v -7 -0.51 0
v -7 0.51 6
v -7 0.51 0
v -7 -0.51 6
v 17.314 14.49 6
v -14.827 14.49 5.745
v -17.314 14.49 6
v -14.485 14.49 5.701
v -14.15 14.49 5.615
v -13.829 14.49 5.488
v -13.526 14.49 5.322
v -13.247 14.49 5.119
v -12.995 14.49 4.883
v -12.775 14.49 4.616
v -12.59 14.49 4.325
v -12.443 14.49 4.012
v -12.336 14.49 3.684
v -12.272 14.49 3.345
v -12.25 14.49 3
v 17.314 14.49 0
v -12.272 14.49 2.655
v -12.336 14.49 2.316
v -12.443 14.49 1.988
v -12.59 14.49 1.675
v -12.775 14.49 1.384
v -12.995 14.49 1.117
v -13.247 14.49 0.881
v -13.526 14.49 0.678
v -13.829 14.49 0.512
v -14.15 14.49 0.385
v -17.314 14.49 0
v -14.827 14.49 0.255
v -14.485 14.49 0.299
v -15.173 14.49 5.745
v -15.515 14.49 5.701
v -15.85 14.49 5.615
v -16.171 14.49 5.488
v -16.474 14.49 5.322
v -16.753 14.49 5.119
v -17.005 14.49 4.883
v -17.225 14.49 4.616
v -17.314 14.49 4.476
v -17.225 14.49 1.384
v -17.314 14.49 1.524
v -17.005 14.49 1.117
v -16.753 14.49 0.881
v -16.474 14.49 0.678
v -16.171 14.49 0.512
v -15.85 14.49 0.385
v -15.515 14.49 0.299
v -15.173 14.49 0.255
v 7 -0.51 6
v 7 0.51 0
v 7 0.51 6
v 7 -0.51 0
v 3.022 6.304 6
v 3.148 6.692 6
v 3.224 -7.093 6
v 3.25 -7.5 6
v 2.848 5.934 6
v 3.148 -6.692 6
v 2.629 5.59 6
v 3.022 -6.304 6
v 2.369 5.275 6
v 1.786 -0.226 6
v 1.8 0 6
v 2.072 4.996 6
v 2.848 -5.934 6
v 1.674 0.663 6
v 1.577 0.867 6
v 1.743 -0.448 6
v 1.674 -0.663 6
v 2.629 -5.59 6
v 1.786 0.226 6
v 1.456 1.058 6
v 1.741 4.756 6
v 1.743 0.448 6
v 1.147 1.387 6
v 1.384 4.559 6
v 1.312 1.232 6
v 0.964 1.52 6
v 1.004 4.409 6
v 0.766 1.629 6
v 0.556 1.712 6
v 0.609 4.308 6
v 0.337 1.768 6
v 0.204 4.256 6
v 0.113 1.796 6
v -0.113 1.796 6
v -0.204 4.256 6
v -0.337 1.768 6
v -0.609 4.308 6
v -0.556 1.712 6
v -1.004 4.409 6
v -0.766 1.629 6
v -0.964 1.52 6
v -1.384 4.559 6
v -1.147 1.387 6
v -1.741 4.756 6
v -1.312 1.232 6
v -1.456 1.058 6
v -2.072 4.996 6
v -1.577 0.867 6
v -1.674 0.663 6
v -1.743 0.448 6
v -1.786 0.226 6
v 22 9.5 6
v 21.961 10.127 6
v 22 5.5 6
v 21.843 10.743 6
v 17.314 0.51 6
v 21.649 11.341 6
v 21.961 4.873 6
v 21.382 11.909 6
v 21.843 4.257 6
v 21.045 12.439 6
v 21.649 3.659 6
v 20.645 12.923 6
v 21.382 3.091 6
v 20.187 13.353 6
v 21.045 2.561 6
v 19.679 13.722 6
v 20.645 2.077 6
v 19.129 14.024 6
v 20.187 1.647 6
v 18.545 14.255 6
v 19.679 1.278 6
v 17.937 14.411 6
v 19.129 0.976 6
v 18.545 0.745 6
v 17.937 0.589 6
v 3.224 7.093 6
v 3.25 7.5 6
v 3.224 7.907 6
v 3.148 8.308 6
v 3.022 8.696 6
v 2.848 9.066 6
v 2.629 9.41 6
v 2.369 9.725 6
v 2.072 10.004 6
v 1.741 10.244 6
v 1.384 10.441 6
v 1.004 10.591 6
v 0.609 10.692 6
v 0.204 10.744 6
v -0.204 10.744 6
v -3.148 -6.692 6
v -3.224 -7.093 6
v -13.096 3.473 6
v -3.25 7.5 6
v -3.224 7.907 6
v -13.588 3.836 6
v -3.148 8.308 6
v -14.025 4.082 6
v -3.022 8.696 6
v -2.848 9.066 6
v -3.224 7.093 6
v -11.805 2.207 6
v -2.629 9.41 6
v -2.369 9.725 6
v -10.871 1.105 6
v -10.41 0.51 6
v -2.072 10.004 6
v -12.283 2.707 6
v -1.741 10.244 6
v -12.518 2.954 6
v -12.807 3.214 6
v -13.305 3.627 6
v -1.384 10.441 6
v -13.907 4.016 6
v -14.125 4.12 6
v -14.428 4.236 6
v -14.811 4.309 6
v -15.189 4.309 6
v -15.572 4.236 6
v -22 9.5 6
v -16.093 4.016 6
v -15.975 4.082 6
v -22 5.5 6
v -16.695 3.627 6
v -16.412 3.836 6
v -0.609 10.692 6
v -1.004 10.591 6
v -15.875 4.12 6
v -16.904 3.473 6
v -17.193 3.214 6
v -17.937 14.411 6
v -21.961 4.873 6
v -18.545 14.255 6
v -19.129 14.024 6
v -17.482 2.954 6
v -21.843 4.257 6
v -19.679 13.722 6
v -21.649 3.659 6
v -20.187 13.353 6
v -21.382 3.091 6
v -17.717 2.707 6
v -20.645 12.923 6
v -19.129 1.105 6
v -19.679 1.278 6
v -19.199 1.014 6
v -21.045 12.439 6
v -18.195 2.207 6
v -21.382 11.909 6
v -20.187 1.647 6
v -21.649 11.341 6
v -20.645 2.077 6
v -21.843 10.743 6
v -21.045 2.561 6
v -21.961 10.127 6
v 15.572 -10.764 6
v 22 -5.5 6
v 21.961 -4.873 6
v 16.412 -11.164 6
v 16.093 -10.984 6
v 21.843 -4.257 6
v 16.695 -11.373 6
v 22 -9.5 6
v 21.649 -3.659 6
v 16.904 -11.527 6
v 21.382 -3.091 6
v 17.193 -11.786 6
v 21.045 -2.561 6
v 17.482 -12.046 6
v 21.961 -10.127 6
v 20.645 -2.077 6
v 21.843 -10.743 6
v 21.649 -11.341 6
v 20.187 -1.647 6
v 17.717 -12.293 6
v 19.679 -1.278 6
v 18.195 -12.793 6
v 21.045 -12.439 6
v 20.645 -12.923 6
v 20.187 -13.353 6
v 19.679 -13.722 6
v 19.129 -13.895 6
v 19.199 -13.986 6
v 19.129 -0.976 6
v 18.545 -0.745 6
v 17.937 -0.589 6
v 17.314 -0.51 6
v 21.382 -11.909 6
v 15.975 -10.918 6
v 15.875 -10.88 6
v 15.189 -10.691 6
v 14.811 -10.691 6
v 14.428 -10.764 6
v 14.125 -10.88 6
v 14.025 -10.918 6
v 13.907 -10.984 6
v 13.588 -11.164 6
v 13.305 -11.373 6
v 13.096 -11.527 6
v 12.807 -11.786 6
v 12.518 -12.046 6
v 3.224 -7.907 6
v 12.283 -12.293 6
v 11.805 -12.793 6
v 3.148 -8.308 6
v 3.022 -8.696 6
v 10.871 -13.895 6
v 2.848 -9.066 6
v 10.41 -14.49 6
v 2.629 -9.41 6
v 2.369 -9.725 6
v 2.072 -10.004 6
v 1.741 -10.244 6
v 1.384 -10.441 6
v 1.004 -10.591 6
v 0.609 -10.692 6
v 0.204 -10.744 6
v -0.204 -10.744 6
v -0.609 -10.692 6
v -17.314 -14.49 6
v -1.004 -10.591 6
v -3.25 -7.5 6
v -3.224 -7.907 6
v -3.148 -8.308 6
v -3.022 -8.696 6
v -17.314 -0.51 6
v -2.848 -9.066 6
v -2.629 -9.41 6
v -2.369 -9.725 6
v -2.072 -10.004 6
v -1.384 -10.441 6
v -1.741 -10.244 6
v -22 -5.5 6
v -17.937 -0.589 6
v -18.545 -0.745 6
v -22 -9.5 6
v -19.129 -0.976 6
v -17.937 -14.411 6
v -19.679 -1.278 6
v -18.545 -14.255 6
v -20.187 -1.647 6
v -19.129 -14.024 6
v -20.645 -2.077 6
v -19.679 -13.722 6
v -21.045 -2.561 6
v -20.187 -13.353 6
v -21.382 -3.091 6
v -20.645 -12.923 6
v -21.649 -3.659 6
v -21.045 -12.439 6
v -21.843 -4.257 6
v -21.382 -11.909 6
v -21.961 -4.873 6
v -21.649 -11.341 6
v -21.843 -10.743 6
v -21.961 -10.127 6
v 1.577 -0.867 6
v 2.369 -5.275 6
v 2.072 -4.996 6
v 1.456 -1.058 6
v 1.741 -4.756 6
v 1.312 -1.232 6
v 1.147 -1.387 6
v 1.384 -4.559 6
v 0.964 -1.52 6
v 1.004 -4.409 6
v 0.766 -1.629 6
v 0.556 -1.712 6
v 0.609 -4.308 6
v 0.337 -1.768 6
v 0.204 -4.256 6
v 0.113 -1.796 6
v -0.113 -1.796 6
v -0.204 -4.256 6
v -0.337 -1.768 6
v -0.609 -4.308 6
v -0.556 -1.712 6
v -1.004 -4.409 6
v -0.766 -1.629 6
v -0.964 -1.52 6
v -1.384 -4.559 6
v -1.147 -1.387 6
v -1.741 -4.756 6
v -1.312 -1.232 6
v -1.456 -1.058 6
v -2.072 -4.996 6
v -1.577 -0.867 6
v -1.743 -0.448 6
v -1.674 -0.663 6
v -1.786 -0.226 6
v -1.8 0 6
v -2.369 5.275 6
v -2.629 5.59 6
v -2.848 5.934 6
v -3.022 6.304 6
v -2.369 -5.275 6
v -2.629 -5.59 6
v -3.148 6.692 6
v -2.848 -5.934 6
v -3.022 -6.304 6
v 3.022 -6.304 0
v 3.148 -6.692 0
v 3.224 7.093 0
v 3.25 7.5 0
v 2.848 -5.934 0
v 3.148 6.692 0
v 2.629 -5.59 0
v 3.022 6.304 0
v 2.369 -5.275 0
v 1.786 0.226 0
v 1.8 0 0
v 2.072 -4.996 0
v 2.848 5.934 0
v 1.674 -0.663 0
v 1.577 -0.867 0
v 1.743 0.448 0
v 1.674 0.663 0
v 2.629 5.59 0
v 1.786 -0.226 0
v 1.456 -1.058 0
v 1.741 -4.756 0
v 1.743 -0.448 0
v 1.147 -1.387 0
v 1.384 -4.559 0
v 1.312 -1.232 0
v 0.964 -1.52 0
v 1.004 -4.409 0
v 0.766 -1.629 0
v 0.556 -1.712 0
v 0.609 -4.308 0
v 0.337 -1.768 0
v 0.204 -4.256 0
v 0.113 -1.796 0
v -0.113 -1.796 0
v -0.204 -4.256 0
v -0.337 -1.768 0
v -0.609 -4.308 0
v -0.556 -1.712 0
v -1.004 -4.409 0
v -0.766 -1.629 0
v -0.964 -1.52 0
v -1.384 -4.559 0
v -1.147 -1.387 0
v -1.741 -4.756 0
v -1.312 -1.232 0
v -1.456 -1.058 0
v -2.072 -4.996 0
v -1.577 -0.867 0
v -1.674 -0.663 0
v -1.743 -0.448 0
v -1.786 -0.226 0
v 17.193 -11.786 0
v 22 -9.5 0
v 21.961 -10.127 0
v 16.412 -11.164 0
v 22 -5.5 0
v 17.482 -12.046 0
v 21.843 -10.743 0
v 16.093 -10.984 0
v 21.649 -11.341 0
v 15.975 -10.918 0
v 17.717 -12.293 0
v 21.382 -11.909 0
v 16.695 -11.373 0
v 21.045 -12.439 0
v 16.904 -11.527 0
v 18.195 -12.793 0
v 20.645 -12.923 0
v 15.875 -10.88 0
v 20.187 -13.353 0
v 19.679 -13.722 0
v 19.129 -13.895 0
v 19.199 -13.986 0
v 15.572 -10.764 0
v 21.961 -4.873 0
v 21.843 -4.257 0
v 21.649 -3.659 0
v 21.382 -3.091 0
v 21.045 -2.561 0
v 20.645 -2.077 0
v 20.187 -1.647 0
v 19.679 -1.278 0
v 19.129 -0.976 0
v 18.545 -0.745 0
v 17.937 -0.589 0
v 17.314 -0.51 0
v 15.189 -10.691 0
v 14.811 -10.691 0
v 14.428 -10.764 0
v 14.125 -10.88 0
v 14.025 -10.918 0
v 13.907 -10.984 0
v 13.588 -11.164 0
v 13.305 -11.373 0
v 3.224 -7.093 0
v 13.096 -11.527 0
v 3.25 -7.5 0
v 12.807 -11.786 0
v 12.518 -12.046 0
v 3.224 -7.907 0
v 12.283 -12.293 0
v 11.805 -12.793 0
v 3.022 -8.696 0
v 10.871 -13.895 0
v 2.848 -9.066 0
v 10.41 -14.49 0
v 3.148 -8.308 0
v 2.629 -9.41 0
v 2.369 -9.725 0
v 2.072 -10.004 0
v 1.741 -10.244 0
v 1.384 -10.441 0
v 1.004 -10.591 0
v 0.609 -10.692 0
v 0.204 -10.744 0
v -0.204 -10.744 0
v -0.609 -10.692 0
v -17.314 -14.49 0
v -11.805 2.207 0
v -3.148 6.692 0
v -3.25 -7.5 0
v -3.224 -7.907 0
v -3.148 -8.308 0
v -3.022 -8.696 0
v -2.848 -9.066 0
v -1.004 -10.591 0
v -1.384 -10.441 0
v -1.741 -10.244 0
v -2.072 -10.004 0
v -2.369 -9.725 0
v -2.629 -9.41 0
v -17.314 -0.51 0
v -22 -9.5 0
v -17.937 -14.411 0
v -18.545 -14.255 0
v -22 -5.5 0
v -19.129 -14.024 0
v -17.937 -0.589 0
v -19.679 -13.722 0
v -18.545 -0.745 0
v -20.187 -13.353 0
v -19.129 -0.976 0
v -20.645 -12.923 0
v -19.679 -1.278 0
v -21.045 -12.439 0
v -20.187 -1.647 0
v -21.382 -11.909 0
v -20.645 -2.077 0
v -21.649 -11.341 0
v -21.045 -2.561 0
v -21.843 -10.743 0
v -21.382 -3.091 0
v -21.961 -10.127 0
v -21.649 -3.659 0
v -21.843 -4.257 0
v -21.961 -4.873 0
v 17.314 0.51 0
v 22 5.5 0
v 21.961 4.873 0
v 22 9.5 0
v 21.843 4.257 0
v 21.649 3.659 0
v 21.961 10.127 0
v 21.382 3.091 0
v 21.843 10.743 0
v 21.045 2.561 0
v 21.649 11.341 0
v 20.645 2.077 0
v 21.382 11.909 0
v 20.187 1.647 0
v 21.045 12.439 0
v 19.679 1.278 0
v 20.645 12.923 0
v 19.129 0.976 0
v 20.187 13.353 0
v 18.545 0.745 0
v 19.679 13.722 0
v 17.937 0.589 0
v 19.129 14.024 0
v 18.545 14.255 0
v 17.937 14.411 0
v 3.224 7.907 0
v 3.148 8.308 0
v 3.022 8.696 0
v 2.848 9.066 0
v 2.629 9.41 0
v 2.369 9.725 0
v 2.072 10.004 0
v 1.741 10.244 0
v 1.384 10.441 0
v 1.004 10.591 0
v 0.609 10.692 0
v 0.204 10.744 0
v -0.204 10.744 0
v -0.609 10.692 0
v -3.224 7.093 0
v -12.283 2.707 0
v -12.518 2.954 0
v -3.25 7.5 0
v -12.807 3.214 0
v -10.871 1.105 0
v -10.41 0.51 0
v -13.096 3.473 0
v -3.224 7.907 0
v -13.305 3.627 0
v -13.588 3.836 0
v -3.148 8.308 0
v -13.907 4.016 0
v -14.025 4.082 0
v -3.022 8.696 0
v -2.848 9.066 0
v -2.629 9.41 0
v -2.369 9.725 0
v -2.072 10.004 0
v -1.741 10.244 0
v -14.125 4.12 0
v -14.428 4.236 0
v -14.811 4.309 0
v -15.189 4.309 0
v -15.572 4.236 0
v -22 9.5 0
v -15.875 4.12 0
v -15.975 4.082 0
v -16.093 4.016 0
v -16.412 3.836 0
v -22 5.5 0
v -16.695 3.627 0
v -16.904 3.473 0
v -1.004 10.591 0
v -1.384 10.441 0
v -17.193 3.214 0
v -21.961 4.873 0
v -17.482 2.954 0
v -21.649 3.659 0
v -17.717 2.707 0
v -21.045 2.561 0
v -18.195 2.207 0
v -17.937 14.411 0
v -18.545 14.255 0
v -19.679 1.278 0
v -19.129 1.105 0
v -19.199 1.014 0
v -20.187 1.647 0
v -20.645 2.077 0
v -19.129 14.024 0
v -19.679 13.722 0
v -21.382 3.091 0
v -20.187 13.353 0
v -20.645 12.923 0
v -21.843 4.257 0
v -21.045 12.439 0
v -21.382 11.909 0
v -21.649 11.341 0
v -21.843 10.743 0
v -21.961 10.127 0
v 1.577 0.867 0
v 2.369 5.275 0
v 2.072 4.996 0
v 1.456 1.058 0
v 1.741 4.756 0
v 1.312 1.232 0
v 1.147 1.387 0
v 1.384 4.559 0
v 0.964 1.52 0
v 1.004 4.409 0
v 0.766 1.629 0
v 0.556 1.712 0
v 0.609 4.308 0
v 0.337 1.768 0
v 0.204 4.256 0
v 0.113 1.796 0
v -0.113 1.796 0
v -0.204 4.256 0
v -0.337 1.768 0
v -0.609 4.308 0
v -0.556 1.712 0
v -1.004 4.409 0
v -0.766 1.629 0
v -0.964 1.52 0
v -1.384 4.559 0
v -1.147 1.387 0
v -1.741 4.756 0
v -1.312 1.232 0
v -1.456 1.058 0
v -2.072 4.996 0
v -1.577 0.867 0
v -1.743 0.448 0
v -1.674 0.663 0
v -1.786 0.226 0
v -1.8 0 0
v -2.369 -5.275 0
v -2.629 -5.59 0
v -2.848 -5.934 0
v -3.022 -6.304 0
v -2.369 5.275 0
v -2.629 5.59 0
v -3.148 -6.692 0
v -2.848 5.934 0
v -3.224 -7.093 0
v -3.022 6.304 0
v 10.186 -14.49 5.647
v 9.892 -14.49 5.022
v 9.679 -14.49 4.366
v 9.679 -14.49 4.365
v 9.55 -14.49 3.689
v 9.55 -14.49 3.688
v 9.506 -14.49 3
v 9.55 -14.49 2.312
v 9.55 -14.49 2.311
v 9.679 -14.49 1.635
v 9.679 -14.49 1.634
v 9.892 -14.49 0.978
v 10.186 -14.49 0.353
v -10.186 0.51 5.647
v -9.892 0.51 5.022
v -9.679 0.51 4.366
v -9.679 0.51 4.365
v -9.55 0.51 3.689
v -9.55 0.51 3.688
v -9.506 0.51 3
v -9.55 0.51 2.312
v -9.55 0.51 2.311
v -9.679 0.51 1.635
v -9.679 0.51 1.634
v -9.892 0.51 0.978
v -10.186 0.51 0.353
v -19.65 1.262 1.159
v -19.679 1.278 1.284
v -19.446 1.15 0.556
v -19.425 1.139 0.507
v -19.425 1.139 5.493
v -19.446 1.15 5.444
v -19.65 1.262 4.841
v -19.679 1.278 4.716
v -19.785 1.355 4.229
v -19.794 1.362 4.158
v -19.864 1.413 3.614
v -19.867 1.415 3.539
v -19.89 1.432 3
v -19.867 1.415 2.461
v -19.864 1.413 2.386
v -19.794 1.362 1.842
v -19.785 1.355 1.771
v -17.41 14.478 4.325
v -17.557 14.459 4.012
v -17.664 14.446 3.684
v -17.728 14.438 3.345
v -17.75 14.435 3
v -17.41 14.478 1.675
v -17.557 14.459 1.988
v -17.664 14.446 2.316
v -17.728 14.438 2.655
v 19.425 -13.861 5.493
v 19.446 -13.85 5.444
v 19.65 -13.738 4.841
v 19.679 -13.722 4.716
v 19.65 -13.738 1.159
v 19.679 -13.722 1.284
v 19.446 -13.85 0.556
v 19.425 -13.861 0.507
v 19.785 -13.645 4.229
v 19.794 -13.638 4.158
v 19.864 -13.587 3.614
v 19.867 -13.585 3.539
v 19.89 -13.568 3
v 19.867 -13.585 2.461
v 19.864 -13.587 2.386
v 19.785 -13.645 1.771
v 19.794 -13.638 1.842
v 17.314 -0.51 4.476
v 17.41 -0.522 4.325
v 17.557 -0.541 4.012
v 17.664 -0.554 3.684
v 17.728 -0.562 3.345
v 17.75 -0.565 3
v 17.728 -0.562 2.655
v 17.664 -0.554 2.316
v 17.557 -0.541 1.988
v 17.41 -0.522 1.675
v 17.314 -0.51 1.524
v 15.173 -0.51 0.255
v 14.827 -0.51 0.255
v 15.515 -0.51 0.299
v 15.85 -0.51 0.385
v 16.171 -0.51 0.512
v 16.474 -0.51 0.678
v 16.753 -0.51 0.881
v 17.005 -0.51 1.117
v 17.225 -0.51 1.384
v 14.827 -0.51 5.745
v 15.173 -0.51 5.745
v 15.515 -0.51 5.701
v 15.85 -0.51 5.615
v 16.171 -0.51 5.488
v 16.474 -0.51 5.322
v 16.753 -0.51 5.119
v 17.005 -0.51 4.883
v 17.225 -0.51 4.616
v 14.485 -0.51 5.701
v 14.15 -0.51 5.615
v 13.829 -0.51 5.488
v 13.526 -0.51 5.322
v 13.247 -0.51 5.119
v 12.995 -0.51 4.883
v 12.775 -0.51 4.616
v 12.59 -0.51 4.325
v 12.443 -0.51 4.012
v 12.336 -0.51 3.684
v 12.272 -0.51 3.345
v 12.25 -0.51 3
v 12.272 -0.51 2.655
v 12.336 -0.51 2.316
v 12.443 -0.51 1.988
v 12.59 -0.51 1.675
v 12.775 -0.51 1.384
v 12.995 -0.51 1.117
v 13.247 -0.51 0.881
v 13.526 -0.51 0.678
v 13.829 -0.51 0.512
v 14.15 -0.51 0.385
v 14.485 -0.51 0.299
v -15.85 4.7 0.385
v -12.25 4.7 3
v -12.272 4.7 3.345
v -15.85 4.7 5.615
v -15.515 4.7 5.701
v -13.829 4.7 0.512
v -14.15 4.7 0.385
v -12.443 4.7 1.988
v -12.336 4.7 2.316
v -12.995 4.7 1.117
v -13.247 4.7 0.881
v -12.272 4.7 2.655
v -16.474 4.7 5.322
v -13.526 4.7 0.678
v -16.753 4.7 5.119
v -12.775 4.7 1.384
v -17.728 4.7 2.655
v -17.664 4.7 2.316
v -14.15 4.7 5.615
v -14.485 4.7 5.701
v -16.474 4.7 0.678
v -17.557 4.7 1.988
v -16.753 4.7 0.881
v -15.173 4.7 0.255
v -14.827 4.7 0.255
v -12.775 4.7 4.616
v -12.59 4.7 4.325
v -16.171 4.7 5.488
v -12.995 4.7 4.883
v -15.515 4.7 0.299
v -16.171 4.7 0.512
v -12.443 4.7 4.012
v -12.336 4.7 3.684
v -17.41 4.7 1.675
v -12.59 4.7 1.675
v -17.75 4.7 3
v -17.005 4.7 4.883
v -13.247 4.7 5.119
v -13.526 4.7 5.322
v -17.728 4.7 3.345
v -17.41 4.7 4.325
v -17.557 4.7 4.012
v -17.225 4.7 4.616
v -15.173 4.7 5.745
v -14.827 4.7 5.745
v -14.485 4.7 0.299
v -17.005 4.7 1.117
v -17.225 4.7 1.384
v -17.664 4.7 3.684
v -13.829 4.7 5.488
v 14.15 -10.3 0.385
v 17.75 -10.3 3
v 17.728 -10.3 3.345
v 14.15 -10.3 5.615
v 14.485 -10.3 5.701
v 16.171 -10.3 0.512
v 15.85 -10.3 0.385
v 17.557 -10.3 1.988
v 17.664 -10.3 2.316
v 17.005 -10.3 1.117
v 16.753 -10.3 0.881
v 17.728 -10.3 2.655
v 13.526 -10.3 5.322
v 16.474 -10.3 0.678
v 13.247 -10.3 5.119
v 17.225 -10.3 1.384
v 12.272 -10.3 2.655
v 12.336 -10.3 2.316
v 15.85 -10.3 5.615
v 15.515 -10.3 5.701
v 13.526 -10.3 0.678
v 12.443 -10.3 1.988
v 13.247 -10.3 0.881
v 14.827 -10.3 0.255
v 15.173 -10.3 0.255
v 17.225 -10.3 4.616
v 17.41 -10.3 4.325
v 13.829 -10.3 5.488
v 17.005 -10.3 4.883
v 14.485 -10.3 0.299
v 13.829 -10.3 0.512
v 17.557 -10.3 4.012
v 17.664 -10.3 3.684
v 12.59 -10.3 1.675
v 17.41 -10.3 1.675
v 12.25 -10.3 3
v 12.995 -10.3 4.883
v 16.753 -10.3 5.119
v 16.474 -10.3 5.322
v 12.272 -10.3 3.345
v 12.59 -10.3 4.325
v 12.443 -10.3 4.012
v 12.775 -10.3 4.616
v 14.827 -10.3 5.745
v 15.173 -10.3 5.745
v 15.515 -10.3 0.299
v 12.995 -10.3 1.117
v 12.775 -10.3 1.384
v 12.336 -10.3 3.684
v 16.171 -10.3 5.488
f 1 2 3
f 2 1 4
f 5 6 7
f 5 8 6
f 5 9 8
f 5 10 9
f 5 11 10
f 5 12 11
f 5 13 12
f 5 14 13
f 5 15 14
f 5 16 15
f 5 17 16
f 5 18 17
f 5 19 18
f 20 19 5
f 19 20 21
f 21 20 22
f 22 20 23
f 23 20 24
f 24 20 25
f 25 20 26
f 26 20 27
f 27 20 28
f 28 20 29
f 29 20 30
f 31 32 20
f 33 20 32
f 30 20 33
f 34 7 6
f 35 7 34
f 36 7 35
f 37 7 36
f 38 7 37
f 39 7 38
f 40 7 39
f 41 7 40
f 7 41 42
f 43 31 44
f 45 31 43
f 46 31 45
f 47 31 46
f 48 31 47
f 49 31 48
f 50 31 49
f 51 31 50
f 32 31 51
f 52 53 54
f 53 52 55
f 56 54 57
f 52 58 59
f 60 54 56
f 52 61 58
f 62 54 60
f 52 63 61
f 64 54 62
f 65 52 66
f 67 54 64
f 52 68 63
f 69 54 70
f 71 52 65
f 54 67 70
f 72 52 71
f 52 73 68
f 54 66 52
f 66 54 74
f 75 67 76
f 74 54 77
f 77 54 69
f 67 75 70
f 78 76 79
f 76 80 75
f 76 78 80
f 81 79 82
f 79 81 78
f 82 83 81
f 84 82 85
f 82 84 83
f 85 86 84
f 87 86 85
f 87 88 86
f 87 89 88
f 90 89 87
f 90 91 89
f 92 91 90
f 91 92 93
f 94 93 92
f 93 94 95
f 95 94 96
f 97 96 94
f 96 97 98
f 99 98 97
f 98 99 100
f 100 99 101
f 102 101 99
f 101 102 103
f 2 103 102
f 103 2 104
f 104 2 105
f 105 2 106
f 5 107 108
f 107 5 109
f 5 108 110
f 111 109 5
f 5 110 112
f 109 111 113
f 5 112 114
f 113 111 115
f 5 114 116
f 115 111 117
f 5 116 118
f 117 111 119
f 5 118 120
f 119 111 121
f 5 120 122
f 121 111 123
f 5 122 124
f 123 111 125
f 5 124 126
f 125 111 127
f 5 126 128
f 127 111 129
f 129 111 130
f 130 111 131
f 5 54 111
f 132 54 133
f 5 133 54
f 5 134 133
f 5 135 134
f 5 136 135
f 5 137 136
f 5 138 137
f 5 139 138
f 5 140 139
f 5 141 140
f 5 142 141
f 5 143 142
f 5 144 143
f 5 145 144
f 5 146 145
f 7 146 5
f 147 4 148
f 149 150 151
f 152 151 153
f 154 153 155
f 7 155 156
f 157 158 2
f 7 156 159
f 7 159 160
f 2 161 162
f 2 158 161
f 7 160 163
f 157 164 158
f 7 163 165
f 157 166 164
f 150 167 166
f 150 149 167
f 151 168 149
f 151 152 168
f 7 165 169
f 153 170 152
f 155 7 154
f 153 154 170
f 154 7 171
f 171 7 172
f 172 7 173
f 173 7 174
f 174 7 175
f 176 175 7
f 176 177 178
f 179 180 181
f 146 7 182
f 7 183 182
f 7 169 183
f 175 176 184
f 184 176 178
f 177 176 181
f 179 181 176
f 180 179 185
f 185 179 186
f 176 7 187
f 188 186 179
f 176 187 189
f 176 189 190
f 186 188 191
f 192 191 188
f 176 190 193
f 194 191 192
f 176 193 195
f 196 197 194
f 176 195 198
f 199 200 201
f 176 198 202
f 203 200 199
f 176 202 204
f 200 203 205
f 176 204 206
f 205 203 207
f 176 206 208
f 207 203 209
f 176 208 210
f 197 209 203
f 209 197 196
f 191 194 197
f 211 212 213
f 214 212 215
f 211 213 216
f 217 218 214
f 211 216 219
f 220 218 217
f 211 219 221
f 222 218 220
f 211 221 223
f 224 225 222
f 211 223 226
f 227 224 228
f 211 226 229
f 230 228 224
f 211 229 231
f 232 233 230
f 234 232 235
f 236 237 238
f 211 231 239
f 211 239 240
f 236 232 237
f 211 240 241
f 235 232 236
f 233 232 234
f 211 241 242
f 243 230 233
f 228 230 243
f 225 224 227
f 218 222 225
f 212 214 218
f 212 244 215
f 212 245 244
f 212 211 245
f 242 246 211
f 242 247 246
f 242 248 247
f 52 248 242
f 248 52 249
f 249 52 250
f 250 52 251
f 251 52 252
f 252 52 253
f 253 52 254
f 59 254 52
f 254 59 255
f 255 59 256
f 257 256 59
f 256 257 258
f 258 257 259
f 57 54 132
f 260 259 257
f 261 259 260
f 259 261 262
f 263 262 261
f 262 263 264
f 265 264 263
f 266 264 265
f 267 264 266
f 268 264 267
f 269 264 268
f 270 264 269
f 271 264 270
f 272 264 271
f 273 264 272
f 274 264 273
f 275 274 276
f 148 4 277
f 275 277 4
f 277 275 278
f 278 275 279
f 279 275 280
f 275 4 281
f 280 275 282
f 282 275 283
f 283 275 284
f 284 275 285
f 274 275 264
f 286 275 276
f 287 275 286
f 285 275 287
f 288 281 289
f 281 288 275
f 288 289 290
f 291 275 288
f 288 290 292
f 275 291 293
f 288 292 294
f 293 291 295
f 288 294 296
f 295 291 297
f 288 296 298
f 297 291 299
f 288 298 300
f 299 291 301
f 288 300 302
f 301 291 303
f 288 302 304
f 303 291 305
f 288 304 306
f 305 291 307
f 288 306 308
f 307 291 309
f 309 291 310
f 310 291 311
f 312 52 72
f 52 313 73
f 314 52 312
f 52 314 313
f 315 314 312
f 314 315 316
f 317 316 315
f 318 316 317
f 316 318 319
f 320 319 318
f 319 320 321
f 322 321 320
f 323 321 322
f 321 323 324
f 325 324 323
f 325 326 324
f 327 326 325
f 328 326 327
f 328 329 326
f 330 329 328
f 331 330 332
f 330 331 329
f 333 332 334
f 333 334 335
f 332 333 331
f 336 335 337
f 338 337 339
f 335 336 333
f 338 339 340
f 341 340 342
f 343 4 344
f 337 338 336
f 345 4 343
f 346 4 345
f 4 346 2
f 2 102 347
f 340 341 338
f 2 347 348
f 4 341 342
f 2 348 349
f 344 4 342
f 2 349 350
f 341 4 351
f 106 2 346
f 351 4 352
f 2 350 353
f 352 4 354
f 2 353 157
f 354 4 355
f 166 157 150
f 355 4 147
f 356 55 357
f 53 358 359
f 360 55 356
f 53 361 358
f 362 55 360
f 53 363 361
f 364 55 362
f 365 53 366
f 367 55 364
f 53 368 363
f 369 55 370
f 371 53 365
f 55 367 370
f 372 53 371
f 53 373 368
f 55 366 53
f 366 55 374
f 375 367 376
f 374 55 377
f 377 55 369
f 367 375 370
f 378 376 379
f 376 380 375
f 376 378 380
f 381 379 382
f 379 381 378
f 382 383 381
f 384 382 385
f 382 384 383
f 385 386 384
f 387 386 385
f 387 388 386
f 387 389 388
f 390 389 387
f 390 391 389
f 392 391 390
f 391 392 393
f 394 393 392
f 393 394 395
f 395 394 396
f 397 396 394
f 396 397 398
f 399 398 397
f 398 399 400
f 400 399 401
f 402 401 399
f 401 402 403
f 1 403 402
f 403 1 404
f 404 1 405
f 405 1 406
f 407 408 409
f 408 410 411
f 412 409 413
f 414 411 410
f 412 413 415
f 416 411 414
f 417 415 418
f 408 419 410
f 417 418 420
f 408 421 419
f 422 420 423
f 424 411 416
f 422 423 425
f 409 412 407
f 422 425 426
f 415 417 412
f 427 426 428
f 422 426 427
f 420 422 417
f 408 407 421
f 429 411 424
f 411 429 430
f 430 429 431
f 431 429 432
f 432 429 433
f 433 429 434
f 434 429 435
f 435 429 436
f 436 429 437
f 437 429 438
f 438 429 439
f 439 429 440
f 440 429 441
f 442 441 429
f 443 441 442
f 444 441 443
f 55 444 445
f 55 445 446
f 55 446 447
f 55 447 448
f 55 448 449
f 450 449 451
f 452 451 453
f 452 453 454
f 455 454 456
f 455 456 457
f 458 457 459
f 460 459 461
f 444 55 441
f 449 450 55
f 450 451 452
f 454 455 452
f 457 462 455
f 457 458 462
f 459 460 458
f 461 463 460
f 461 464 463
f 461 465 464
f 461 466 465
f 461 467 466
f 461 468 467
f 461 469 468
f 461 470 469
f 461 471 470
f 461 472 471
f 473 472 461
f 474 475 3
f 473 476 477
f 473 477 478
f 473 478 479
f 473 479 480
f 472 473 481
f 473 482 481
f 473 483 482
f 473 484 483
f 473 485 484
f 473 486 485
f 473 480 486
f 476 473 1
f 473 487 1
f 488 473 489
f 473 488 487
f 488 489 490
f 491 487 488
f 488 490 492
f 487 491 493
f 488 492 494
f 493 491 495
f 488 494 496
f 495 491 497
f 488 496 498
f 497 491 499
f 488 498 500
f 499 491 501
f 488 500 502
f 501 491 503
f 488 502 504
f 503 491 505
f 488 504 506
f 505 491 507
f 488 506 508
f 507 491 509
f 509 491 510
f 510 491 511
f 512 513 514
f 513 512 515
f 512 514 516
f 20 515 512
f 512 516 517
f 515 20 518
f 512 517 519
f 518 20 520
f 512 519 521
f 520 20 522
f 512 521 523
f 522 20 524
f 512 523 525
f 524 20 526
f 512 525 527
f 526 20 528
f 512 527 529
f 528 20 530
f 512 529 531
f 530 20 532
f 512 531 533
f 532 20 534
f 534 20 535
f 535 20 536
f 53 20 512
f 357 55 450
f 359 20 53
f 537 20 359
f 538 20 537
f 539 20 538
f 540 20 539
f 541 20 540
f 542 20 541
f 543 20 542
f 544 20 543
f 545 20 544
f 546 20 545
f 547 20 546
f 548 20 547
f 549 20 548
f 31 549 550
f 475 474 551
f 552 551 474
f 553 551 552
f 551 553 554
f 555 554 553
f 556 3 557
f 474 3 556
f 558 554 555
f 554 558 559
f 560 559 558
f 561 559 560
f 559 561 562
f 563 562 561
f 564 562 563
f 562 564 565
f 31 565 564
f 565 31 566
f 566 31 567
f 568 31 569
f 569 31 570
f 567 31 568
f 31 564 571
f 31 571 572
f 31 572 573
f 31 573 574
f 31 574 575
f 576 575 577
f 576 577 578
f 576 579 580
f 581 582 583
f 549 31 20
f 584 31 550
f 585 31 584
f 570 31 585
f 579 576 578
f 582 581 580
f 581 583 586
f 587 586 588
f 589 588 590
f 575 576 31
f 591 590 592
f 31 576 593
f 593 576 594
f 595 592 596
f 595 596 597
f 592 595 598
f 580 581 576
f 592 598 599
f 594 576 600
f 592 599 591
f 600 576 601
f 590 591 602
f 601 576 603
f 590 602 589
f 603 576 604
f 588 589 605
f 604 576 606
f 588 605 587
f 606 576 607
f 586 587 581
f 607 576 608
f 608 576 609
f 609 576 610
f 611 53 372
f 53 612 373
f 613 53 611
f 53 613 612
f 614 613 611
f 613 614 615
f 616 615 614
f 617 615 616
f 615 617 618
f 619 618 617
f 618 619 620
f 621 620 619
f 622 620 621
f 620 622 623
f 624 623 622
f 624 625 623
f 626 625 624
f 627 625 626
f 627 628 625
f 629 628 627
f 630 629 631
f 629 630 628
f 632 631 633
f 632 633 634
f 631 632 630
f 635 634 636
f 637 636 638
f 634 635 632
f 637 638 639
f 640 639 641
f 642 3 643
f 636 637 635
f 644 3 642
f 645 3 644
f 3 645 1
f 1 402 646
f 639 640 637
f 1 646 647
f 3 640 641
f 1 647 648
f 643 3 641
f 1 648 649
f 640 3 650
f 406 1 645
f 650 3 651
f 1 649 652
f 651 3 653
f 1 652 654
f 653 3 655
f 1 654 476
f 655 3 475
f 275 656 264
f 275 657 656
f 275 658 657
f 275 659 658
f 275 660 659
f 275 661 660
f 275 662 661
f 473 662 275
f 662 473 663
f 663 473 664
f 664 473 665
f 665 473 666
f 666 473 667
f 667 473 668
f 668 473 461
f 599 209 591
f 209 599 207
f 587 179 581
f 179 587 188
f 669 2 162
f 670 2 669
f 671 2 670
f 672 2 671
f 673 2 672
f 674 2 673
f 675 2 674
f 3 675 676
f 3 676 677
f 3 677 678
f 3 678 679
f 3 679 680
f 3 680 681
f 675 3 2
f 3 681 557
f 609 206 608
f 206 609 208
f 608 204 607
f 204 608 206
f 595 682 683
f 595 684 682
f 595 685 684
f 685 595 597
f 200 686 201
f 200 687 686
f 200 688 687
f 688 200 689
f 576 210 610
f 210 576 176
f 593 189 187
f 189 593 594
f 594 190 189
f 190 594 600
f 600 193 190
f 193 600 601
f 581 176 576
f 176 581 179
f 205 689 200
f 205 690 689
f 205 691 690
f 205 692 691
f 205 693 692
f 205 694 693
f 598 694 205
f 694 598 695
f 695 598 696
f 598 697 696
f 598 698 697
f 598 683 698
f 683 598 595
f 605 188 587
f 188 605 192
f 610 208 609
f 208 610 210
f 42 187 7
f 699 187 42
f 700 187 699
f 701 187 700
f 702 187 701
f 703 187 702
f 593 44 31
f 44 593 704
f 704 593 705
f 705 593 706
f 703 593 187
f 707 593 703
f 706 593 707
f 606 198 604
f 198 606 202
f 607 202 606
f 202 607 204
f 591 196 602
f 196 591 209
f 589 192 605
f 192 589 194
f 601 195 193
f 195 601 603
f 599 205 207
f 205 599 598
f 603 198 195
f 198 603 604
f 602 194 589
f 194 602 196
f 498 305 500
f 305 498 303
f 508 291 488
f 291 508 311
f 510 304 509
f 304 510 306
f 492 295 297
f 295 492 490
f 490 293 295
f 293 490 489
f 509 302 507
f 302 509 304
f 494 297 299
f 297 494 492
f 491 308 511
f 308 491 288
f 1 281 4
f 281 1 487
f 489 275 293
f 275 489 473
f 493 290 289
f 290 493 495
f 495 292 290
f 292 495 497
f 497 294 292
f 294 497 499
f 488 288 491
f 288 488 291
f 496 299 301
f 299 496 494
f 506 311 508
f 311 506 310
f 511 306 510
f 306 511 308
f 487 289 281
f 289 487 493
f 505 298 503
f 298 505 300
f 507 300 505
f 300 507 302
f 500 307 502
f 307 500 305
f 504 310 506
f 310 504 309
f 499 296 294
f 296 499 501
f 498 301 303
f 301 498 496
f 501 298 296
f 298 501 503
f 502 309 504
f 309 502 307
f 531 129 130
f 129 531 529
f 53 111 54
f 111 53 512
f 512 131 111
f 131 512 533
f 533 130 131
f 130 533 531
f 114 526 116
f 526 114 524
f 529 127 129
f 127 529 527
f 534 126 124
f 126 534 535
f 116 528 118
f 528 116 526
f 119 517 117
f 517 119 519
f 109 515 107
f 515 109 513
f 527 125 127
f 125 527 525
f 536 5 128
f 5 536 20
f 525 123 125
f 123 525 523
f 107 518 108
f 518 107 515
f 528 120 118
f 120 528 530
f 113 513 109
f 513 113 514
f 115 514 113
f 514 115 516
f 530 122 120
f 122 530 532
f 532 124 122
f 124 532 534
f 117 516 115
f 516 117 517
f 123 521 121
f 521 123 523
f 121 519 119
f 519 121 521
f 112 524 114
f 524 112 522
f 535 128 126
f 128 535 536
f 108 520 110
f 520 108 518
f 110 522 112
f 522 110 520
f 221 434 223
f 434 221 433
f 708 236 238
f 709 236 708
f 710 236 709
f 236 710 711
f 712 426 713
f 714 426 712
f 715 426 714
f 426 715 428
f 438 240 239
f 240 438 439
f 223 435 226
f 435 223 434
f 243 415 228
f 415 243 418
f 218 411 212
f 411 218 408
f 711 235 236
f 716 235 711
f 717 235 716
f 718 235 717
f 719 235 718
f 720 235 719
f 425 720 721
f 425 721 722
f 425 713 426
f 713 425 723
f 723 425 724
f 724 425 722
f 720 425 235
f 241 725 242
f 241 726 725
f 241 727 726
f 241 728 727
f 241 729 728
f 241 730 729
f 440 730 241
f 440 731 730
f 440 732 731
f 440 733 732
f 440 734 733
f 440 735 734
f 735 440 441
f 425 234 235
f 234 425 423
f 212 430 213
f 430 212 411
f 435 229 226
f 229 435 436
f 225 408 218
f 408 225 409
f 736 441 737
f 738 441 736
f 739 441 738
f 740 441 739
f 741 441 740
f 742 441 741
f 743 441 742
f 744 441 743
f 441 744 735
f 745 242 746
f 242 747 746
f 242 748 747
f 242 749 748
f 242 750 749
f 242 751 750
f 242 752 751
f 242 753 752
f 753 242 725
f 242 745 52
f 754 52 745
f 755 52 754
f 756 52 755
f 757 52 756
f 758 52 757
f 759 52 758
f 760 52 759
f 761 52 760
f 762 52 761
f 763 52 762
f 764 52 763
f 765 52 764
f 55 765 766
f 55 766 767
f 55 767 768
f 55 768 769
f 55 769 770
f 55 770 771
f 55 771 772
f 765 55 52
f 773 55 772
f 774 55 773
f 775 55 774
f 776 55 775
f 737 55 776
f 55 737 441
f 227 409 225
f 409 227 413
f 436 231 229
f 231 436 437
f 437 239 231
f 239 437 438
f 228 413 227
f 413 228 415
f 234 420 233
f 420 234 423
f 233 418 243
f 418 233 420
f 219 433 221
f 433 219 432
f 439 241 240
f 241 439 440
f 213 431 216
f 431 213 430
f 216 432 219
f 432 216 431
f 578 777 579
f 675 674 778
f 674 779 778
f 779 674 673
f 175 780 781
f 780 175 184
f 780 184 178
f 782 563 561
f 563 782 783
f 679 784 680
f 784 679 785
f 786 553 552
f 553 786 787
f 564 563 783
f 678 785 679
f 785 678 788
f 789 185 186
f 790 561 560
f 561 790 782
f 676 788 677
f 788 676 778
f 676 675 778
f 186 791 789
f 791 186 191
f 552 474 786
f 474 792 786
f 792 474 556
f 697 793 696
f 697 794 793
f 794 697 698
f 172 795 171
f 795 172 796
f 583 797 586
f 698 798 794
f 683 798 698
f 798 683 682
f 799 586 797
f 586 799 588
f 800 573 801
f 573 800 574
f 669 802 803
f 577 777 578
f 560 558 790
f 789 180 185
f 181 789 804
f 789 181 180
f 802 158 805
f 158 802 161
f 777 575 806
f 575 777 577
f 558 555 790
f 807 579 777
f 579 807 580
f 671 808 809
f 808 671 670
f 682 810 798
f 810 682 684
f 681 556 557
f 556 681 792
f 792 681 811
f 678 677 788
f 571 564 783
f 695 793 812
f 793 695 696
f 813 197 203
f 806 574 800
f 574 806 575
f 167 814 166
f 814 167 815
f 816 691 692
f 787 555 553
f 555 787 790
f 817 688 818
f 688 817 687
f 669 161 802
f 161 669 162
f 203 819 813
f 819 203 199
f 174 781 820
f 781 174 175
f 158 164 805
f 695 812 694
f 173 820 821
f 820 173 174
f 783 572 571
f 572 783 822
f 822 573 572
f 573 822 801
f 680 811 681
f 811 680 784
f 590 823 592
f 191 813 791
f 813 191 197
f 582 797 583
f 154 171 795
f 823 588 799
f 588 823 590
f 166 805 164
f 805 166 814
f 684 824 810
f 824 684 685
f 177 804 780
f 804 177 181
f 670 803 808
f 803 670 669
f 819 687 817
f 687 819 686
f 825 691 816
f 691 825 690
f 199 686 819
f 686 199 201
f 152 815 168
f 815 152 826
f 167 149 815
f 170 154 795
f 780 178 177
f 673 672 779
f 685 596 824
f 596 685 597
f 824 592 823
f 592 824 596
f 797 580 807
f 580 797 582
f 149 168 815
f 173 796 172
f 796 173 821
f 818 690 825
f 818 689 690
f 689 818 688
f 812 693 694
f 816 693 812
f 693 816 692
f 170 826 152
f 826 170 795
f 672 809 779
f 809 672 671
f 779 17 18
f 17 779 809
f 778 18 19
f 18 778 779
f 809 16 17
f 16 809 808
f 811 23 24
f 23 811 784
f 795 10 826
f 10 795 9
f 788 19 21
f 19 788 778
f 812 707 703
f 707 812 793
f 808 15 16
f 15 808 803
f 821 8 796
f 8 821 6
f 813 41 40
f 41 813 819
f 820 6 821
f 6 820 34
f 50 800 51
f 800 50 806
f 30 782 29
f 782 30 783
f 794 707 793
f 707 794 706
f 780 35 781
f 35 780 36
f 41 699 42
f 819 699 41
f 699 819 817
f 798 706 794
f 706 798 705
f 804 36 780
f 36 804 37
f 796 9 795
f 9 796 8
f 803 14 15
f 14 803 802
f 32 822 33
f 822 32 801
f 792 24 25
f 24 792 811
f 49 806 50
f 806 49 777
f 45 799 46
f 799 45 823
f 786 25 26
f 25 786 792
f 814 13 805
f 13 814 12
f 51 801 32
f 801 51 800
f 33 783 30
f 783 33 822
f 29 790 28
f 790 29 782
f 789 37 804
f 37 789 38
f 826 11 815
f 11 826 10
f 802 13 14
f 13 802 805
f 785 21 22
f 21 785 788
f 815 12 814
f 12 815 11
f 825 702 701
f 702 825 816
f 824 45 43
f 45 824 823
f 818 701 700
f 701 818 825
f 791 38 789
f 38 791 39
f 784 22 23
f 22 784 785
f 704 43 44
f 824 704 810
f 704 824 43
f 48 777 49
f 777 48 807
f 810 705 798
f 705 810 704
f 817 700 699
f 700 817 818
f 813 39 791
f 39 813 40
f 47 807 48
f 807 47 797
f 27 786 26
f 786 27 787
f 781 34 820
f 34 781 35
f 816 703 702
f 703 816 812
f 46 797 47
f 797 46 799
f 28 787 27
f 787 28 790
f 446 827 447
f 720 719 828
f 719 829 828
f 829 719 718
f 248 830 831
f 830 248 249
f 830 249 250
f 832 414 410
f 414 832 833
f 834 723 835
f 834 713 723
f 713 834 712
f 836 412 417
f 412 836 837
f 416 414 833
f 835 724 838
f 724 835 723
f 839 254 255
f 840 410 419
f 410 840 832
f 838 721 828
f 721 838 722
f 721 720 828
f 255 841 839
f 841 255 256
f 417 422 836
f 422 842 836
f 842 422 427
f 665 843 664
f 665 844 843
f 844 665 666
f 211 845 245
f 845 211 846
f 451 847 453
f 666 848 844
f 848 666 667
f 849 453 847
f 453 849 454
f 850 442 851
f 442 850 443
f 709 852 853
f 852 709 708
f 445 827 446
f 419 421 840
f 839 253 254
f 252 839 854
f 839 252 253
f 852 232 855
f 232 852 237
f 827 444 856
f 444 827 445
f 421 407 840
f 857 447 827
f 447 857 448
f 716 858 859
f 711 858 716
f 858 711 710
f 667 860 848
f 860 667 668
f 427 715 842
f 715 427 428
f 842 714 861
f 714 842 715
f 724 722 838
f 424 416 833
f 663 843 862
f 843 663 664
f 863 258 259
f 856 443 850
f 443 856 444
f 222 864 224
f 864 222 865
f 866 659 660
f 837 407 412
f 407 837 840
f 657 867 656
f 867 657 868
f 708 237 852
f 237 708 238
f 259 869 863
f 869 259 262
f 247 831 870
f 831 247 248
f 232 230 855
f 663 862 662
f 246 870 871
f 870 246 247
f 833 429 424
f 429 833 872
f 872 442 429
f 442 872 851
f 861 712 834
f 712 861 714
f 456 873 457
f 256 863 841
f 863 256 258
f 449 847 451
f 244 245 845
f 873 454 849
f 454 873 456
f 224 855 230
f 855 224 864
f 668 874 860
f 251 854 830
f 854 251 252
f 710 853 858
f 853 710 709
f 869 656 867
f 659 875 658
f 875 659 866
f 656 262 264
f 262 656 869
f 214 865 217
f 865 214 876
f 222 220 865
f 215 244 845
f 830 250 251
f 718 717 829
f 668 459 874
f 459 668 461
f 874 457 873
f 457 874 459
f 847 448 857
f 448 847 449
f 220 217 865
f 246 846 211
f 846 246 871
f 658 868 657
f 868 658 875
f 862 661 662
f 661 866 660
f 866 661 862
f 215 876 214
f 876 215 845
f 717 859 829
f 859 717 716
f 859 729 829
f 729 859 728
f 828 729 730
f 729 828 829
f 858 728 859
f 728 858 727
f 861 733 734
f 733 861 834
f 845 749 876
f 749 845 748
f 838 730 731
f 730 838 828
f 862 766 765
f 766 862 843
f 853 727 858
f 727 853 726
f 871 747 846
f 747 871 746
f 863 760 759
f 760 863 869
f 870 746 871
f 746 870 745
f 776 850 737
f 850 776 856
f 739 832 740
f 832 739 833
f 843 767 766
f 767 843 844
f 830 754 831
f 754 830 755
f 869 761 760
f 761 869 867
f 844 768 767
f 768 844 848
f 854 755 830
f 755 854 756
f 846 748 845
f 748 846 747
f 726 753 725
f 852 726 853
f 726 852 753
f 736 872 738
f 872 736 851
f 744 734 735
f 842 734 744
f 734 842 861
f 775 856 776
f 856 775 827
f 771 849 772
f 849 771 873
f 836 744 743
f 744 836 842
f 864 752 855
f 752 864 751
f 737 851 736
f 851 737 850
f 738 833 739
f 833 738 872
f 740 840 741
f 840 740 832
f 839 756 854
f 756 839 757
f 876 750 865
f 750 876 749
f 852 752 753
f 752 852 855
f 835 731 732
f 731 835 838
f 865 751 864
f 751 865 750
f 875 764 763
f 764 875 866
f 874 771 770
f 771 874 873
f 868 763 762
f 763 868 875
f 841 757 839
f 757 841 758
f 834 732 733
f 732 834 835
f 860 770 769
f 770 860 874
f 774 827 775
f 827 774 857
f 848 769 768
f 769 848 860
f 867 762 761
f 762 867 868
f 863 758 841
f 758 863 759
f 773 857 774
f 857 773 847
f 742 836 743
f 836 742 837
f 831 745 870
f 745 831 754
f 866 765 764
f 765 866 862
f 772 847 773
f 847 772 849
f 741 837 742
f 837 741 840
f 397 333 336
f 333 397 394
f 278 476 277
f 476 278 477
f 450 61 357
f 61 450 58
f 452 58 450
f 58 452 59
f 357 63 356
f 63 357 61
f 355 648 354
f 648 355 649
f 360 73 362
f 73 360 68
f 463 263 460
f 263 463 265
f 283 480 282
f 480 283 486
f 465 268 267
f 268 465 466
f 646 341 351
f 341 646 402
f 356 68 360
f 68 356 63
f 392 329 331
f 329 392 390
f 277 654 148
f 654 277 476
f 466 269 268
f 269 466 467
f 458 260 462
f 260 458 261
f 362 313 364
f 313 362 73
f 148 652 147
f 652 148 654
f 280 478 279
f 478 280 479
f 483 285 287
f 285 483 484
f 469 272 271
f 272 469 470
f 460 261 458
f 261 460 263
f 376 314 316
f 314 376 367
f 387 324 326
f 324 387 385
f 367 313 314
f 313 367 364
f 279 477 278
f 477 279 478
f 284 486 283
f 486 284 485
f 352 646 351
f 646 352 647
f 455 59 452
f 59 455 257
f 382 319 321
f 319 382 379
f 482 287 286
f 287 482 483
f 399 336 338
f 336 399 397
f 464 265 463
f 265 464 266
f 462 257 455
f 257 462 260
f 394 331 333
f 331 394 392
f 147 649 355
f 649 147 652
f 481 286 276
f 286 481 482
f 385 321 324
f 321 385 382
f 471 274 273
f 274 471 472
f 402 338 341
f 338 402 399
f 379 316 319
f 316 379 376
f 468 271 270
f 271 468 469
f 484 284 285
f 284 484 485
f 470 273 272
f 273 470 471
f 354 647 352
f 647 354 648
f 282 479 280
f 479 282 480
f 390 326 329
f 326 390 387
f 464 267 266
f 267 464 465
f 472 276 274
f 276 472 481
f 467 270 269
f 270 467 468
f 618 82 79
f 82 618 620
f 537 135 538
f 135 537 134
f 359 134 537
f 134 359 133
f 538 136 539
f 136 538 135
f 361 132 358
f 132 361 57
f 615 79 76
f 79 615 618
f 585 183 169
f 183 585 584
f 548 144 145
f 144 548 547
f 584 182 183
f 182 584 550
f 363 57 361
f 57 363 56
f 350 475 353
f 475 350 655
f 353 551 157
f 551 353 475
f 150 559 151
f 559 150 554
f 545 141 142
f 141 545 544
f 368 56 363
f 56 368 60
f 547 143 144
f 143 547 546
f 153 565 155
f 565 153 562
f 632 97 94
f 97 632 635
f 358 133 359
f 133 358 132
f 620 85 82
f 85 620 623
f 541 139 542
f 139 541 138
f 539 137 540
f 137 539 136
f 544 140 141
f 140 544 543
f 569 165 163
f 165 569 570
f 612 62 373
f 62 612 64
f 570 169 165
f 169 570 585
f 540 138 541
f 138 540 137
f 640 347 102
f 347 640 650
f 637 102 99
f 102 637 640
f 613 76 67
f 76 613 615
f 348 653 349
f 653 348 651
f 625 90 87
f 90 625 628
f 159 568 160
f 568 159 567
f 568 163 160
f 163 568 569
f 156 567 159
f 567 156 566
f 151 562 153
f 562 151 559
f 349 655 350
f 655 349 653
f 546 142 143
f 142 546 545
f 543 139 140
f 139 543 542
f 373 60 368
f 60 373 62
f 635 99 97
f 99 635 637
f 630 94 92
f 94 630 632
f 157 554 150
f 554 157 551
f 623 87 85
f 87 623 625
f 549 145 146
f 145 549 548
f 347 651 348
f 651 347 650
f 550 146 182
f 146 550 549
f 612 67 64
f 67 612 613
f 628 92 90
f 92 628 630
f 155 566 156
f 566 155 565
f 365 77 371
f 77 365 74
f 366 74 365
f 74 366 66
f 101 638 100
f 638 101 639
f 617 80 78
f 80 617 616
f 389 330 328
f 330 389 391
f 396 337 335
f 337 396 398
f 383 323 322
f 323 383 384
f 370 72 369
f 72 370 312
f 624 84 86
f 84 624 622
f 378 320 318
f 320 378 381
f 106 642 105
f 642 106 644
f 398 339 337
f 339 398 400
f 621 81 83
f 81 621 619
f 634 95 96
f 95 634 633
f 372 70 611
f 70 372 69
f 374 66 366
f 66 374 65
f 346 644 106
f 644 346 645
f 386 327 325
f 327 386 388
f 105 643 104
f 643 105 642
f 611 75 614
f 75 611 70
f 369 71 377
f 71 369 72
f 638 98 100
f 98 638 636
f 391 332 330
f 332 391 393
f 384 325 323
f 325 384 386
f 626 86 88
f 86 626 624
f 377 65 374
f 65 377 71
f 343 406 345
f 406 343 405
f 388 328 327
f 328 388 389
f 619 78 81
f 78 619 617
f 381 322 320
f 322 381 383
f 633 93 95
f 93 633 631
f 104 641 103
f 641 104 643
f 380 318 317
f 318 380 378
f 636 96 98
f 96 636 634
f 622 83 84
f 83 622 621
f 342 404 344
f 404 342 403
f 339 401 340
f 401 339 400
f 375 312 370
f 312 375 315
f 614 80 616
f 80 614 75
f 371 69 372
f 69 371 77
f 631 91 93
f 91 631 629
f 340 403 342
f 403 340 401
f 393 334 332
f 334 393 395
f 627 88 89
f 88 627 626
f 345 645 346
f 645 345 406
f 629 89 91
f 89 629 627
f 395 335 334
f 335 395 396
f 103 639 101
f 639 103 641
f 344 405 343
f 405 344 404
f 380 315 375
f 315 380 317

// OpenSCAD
$fn = 50;


difference() {
	union() {
		hull() {
			translate(v = [-2.0000000000, 9.5000000000, 0]) {
				cylinder(h = 6, r = 5);
			}
			translate(v = [2.0000000000, 9.5000000000, 0]) {
				cylinder(h = 6, r = 5);
			}
			translate(v = [-2.0000000000, -9.5000000000, 0]) {
				cylinder(h = 6, r = 5);
			}
			translate(v = [2.0000000000, -9.5000000000, 0]) {
				cylinder(h = 6, r = 5);
			}
		}
		translate(v = [-7.5000000000, 7.5000000000, 0]) {
			hull() {
				translate(v = [-9.5000000000, 2.0000000000, 0]) {
					cylinder(h = 6, r = 5);
				}
				translate(v = [9.5000000000, 2.0000000000, 0]) {
					cylinder(h = 6, r = 5);
				}
				translate(v = [-9.5000000000, -2.0000000000, 0]) {
					cylinder(h = 6, r = 5);
				}
				translate(v = [9.5000000000, -2.0000000000, 0]) {
					cylinder(h = 6, r = 5);
				}
			}
		}
		translate(v = [-7.5000000000, -7.5000000000, 0]) {
			hull() {
				translate(v = [-9.5000000000, 2.0000000000, 0]) {
					cylinder(h = 6, r = 5);
				}
				translate(v = [9.5000000000, 2.0000000000, 0]) {
					cylinder(h = 6, r = 5);
				}
				translate(v = [-9.5000000000, -2.0000000000, 0]) {
					cylinder(h = 6, r = 5);
				}
				translate(v = [9.5000000000, -2.0000000000, 0]) {
					cylinder(h = 6, r = 5);
				}
			}
		}
		translate(v = [7.5000000000, 7.5000000000, 0]) {
			hull() {
				translate(v = [-9.5000000000, 2.0000000000, 0]) {
					cylinder(h = 6, r = 5);
				}
				translate(v = [9.5000000000, 2.0000000000, 0]) {
					cylinder(h = 6, r = 5);
				}
				translate(v = [-9.5000000000, -2.0000000000, 0]) {
					cylinder(h = 6, r = 5);
				}
				translate(v = [9.5000000000, -2.0000000000, 0]) {
					cylinder(h = 6, r = 5);
				}
			}
		}
		translate(v = [7.5000000000, -7.5000000000, 0]) {
			hull() {
				translate(v = [-9.5000000000, 2.0000000000, 0]) {
					cylinder(h = 6, r = 5);
				}
				translate(v = [9.5000000000, 2.0000000000, 0]) {
					cylinder(h = 6, r = 5);
				}
				translate(v = [-9.5000000000, -2.0000000000, 0]) {
					cylinder(h = 6, r = 5);
				}
				translate(v = [9.5000000000, -2.0000000000, 0]) {
					cylinder(h = 6, r = 5);
				}
			}
		}
	}
	union() {
		translate(v = [-15.0000000000, 0.5000000000, 3.0000000000]) {
			rotate(a = [90, 0, 0]) {
				difference() {
					union() {
						#translate(v = [0, 0, -14.0000000000]) {
							cylinder(h = 14, r = 2.2500000000);
						}
						#translate(v = [0, 0, -4.2000000000]) {
							cylinder(h = 4.2000000000, r1 = 2.7500000000, r2 = 5.5000000000);
						}
						#translate(v = [0, 0, -14.0000000000]) {
							cylinder(h = 14, r = 2.7500000000);
						}
						#translate(v = [0, 0, -14.0000000000]) {
							cylinder(h = 14, r = 2.2500000000);
						}
					}
					union();
				}
			}
		}
		translate(v = [15.0000000000, -14.5000000000, 3.0000000000]) {
			rotate(a = [90, 0, 0]) {
				difference() {
					union() {
						#translate(v = [0, 0, -14.0000000000]) {
							cylinder(h = 14, r = 2.2500000000);
						}
						#translate(v = [0, 0, -4.2000000000]) {
							cylinder(h = 4.2000000000, r1 = 2.7500000000, r2 = 5.5000000000);
						}
						#translate(v = [0, 0, -14.0000000000]) {
							cylinder(h = 14, r = 2.7500000000);
						}
						#translate(v = [0, 0, -14.0000000000]) {
							cylinder(h = 14, r = 2.2500000000);
						}
					}
					union();
				}
			}
		}
		translate(v = [0.0000000000, -7.5000000000, 0]) {
			translate(v = [0, 0, -100]) {
				cylinder(h = 200, r = 3.2500000000);
			}
		}
		translate(v = [0.0000000000, 7.5000000000, 0]) {
			translate(v = [0, 0, -100]) {
				cylinder(h = 200, r = 3.2500000000);
			}
		}
		translate(v = [0.0000000000, -7.5000000000, 0]) {
			translate(v = [0, 0, -100]) {
				cylinder(h = 200, r = 1.8000000000);
			}
		}
		translate(v = [0, 0, -100]) {
			cylinder(h = 200, r = 1.8000000000);
		}
		translate(v = [0.0000000000, 7.5000000000, 0]) {
			translate(v = [0, 0, -100]) {
				cylinder(h = 200, r = 1.8000000000);
			}
		}
	}
}
